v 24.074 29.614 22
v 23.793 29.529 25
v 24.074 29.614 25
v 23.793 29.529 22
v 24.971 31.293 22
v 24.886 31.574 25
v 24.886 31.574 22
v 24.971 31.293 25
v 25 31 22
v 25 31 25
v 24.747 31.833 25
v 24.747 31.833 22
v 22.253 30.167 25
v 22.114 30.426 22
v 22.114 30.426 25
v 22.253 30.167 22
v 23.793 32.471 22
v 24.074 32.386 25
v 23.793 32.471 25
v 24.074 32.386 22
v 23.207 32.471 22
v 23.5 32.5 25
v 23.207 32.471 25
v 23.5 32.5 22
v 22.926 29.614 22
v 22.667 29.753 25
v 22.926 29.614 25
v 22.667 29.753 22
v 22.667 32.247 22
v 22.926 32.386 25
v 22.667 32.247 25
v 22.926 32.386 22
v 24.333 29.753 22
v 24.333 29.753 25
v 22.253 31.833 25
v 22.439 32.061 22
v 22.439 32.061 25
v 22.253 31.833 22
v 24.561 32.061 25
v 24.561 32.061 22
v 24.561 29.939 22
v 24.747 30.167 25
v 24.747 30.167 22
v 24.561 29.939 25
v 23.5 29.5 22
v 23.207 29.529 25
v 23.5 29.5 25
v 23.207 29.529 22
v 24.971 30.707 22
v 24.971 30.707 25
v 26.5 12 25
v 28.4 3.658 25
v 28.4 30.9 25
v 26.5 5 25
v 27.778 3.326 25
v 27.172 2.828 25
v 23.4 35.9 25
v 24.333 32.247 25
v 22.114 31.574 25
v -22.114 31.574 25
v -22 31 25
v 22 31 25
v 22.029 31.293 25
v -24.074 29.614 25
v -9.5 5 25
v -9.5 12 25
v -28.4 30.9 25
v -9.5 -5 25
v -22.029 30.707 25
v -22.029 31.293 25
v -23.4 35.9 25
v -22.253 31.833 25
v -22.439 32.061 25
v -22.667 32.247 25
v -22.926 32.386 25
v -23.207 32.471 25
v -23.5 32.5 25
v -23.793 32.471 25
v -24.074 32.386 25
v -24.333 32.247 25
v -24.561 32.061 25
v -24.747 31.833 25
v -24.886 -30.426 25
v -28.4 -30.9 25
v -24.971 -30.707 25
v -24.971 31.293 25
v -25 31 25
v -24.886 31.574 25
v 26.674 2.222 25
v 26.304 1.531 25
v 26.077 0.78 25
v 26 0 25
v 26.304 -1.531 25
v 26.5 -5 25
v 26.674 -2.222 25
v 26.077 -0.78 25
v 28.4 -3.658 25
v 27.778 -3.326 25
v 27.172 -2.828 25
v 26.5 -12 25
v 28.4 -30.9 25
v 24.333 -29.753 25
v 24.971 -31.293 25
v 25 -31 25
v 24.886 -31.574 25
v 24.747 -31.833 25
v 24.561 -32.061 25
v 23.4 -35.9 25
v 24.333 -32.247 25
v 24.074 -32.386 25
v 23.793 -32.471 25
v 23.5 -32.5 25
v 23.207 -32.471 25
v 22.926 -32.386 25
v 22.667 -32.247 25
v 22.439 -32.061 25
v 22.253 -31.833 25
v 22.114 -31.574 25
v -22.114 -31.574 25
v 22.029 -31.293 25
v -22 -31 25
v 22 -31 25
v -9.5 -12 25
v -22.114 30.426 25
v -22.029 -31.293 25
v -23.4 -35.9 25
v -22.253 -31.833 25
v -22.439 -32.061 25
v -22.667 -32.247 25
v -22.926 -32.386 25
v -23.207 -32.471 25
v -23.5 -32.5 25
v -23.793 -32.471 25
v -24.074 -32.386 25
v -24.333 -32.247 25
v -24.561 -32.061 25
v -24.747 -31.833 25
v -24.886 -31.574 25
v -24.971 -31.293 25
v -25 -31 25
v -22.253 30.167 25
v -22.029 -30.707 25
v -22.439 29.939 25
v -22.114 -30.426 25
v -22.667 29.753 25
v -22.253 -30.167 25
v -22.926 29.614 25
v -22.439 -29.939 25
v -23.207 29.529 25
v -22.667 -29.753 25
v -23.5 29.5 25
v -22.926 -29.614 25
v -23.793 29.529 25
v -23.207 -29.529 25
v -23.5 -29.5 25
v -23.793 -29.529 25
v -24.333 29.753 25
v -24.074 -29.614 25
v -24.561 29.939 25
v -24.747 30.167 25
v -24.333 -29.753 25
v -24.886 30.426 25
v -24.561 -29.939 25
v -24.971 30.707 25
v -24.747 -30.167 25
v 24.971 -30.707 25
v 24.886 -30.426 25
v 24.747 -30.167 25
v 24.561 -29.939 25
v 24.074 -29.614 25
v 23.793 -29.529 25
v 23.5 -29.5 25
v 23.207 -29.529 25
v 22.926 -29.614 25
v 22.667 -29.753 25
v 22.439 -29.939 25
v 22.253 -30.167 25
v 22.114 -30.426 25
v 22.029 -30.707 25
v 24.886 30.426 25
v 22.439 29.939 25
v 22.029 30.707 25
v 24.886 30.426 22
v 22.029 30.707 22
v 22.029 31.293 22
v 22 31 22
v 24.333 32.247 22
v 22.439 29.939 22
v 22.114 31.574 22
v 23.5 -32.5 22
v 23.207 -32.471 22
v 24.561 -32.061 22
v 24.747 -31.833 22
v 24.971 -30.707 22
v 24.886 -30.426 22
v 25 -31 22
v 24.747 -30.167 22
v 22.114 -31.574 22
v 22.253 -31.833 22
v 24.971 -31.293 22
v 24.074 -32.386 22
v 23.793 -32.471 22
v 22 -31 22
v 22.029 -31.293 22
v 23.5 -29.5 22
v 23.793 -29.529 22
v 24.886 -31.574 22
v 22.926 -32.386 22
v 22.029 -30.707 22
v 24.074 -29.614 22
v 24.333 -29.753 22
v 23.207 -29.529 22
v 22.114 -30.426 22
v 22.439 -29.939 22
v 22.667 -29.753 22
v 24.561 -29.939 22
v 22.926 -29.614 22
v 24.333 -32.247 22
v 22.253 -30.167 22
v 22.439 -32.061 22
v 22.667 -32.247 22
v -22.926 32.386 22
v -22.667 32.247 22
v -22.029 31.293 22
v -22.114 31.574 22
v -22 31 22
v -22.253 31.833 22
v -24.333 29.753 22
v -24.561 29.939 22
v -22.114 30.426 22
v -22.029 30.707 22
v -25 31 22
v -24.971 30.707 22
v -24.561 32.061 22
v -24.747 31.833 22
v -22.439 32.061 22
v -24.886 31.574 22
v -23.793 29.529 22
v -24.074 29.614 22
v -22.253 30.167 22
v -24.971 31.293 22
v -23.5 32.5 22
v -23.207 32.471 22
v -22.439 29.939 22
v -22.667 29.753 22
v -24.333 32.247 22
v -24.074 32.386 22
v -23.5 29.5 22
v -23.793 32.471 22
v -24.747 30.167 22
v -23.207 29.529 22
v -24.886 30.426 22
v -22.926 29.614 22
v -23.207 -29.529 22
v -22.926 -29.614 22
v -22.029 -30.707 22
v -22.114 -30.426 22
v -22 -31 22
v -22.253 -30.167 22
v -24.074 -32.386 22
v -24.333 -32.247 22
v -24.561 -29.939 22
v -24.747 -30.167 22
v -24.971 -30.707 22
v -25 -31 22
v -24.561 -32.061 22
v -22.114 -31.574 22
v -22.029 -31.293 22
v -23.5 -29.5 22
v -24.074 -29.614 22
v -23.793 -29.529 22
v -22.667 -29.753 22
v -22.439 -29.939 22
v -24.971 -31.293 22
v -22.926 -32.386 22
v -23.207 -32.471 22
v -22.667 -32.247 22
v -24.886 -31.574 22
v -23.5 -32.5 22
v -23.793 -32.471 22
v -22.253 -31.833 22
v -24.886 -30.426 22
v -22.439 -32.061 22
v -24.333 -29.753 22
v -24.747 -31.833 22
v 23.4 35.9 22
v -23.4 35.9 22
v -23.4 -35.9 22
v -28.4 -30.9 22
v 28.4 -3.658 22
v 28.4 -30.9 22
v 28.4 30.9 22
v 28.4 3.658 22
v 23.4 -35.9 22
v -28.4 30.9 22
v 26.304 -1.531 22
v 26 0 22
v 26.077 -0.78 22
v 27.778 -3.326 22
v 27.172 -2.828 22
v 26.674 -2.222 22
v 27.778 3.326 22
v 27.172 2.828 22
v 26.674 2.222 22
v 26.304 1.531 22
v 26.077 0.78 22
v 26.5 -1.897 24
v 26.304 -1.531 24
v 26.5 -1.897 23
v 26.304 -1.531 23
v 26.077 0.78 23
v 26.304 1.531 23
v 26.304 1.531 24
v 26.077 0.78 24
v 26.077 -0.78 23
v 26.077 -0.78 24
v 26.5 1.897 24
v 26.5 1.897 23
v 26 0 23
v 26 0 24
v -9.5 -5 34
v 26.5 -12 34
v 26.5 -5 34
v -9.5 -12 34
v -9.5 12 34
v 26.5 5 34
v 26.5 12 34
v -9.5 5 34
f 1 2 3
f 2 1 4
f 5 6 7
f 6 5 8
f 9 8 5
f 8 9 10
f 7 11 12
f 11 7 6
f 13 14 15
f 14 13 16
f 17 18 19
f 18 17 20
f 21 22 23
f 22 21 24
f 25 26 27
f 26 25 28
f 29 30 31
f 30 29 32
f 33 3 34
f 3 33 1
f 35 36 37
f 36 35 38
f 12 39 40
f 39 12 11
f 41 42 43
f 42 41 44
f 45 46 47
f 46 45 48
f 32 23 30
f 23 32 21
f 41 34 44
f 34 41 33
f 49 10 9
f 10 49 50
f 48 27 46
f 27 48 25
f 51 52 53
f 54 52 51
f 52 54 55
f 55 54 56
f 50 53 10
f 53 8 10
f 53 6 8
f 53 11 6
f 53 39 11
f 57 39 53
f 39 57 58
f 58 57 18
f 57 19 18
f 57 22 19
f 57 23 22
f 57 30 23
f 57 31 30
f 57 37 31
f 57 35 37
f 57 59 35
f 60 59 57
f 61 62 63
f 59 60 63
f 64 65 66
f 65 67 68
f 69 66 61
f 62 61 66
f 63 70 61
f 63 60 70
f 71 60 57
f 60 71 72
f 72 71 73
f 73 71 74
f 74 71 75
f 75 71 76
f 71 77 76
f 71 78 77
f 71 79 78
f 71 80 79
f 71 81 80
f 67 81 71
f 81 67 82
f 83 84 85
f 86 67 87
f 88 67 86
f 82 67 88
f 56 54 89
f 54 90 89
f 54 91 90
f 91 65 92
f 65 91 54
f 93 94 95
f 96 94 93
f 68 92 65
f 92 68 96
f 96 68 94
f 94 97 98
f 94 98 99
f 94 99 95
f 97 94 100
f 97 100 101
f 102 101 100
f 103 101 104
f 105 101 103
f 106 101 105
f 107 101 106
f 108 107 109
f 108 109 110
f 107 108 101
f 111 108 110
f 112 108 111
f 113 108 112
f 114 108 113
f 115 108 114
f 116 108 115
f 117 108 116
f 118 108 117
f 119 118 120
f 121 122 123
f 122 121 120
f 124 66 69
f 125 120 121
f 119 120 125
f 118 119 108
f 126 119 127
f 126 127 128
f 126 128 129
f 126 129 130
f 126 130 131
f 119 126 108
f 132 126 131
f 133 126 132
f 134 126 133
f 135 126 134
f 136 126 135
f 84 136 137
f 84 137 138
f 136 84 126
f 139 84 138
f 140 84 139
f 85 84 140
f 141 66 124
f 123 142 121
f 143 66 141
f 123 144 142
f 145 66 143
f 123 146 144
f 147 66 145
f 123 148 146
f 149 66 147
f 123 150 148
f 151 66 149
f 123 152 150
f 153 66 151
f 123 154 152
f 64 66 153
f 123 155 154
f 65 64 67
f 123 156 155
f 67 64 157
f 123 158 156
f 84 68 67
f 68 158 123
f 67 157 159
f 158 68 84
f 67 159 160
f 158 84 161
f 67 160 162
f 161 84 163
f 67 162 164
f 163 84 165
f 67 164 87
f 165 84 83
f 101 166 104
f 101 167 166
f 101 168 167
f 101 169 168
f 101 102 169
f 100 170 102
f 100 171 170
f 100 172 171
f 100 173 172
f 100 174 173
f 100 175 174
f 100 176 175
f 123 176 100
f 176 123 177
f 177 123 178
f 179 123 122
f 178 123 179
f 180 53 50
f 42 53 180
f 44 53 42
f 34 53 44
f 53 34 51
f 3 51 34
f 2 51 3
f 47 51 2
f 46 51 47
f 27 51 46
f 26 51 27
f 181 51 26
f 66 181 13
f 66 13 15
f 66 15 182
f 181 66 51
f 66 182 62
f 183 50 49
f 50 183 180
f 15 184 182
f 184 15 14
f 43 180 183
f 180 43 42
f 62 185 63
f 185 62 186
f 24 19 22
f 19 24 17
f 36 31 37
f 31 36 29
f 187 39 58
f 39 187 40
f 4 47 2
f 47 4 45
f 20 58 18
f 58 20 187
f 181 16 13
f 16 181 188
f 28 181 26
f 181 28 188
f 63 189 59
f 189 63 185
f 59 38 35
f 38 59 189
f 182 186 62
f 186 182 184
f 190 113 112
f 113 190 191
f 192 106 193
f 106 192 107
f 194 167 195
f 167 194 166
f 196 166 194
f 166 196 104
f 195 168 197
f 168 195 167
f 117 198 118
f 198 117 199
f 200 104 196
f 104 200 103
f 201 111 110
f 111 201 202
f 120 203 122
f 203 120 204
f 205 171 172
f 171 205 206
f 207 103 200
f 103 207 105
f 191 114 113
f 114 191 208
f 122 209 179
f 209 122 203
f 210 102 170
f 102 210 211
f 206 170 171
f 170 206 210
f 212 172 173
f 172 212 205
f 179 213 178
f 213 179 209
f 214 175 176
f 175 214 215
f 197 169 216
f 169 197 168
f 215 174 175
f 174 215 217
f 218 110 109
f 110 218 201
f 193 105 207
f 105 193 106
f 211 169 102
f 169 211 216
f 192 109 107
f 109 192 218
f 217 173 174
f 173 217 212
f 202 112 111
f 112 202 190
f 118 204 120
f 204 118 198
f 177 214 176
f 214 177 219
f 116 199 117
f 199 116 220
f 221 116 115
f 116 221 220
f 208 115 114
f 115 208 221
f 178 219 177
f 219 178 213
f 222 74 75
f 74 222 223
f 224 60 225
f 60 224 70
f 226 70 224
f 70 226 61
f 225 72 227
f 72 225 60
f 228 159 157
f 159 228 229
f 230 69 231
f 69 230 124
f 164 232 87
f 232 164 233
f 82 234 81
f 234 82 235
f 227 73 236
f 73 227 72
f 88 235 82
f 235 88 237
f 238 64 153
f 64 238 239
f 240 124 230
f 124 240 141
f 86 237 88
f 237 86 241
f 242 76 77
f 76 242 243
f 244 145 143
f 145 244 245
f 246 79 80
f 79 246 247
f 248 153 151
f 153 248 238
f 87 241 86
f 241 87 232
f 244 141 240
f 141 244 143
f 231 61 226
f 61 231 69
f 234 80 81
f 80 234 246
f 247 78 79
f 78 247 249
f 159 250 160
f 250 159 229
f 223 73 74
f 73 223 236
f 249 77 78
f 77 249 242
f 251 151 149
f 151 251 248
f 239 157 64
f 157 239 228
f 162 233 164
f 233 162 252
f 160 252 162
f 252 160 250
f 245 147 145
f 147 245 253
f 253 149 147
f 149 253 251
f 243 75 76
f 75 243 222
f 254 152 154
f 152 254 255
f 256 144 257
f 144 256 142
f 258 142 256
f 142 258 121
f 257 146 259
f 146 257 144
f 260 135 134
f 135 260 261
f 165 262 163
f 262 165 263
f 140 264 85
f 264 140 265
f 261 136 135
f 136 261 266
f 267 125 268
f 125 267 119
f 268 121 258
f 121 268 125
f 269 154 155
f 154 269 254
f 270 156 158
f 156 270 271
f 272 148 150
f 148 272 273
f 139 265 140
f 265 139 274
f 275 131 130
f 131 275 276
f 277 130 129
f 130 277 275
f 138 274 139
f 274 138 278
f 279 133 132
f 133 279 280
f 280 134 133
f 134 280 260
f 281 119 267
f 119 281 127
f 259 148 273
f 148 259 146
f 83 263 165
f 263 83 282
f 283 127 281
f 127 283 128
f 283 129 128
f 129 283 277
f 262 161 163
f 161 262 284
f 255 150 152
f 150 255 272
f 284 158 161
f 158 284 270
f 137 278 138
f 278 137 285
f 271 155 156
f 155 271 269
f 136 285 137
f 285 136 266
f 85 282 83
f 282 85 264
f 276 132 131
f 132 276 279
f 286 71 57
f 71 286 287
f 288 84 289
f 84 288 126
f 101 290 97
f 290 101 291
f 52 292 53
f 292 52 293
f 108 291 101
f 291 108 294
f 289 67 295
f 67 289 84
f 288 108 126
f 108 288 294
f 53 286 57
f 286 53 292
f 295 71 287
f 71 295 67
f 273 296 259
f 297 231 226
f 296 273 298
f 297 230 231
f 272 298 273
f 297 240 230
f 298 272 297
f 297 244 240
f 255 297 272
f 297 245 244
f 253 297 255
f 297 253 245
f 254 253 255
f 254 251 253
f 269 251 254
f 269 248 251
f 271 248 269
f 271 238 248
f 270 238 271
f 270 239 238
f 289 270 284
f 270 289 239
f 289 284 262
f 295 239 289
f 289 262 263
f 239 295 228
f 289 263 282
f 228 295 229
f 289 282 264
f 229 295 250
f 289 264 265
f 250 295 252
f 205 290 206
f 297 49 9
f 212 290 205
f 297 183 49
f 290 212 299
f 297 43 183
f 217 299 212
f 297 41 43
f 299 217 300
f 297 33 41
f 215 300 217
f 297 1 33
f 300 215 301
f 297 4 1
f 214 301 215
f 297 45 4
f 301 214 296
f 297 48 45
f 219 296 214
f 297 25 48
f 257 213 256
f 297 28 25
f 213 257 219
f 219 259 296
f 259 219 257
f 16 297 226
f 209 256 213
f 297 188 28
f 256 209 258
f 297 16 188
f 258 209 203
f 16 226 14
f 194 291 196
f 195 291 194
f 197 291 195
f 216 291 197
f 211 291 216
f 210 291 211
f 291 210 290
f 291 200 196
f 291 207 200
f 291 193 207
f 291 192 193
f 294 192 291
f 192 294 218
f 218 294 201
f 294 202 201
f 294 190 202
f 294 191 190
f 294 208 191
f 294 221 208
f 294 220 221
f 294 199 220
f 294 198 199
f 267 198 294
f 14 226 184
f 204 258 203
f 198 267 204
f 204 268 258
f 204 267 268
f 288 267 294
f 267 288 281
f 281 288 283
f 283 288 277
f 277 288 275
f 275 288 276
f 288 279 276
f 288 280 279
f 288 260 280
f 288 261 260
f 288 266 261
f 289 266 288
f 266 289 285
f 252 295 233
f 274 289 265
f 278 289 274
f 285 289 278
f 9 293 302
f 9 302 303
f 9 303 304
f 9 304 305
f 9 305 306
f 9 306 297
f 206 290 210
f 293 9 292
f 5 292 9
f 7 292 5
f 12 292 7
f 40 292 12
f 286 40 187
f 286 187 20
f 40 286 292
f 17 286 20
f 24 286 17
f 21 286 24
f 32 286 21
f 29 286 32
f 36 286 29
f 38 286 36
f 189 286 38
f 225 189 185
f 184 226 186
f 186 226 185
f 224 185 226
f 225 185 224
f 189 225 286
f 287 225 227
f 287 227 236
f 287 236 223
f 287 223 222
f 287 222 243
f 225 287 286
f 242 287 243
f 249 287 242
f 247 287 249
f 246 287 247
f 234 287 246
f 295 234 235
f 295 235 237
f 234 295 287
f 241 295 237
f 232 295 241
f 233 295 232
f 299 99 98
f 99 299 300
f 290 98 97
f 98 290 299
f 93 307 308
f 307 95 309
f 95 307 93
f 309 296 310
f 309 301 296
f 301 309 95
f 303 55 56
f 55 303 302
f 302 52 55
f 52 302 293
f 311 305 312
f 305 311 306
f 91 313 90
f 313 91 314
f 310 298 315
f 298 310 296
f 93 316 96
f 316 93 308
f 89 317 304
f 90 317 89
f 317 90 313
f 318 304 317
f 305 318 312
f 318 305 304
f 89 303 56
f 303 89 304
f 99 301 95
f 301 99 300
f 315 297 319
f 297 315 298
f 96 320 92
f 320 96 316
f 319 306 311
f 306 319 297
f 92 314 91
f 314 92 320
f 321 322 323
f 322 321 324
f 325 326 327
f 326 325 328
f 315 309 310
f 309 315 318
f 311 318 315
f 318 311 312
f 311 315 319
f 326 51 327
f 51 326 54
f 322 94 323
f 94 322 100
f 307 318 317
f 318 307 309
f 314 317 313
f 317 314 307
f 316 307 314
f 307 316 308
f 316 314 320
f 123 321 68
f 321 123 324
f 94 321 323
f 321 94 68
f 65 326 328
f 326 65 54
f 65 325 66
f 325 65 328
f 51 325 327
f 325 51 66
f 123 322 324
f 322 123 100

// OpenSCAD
part = "cover"; // [enclosure:Enclosure, cover:Cover, both:Enclosure and Cover]

VINDIRKING_WIDTH = 53; // mm
VINDIRKING_DEPTH = 50; // mm
VINDIRKING_USB_FRONT = 17; // mm
VINDIRKING_USB_SIDE  = 13; // mm
VINDIRKING_USB_HEIGHT = 10; // mm


cablewidth = (VINDIRKING_WIDTH - (VINDIRKING_USB_SIDE * 2) - 13)/2;

module holder() { translate([-VINDIRKING_DEPTH/2,-VINDIRKING_WIDTH/2,0]) difference(){
cube([VINDIRKING_DEPTH, VINDIRKING_WIDTH, VINDIRKING_USB_HEIGHT+1]);
translate([0,0,1]) {
linear_extrude(VINDIRKING_USB_HEIGHT) polygon([
[0,0],
[0,VINDIRKING_WIDTH],
[VINDIRKING_DEPTH,VINDIRKING_WIDTH],
[VINDIRKING_DEPTH,0],
[VINDIRKING_DEPTH-VINDIRKING_USB_SIDE,0],
[VINDIRKING_DEPTH-VINDIRKING_USB_SIDE,VINDIRKING_WIDTH-VINDIRKING_USB_FRONT],
[VINDIRKING_DEPTH-VINDIRKING_USB_SIDE-cablewidth,VINDIRKING_WIDTH-VINDIRKING_USB_FRONT],
[VINDIRKING_DEPTH-VINDIRKING_USB_SIDE-cablewidth,0],
[VINDIRKING_USB_SIDE+cablewidth,0],
[VINDIRKING_USB_SIDE+cablewidth,VINDIRKING_WIDTH-VINDIRKING_USB_FRONT],
[VINDIRKING_USB_SIDE,VINDIRKING_WIDTH-VINDIRKING_USB_FRONT],
[VINDIRKING_USB_SIDE,0],
]);
};
};
};


// https://github.com/gregmarra/project_box
// The MIT License (MIT)
// 
// Copyright (c) 2014 Greg Marra
// 
// Permission is hereby granted, free of charge, to any person obtaining a copy
// of this software and associated documentation files (the "Software"), to deal
// in the Software without restriction, including without limitation the rights
// to use, copy, modify, merge, publish, distribute, sublicense, and/or sell
// copies of the Software, and to permit persons to whom the Software is
// furnished to do so, subject to the following conditions:
// 
// The above copyright notice and this permission notice shall be included in all
// copies or substantial portions of the Software.
// 
// THE SOFTWARE IS PROVIDED "AS IS", WITHOUT WARRANTY OF ANY KIND, EXPRESS OR
// IMPLIED, INCLUDING BUT NOT LIMITED TO THE WARRANTIES OF MERCHANTABILITY,
// FITNESS FOR A PARTICULAR PURPOSE AND NONINFRINGEMENT. IN NO EVENT SHALL THE
// AUTHORS OR COPYRIGHT HOLDERS BE LIABLE FOR ANY CLAIM, DAMAGES OR OTHER
// LIABILITY, WHETHER IN AN ACTION OF CONTRACT, TORT OR OTHERWISE, ARISING FROM,
// OUT OF OR IN CONNECTION WITH THE SOFTWARE OR THE USE OR OTHER DEALINGS IN THE
// SOFTWARE.

enclosure_inner_length = 55;
enclosure_inner_width = 70;
enclosure_inner_depth = 20;

enclosure_thickness = 2;

cover_thickness = 3;


print_part();

module print_part() {
	if (part == "enclosure") {
		box2(enclosure_inner_length,enclosure_inner_width,enclosure_inner_depth,enclosure_thickness,enclosure_thickness/2-0.10,cover_thickness);
	} else if (part == "cover") {
		lid2(enclosure_inner_length,enclosure_inner_width,enclosure_inner_depth,enclosure_thickness,enclosure_thickness/2+0.10,cover_thickness);
	} else {
		both();
	}
}

module both() {

	box2(enclosure_inner_length,enclosure_inner_width,enclosure_inner_depth,enclosure_thickness,enclosure_thickness/2-0.10,cover_thickness);
	lid2(enclosure_inner_length,enclosure_inner_width,enclosure_inner_depth,enclosure_thickness,enclosure_thickness/2+0.10,cover_thickness);

}

module screws(in_x, in_y, in_z, shell) {

	sx = in_x/2 - 4;
	sy = in_y/2 - 4;
	sh = shell + in_z - 12;
	nh = shell + in_z - 4;

	translate([0,0,0]) {
		translate([sx , sy, sh]) cylinder(r=1.5, h = 15, $fn=32);
		translate([sx , -sy, sh ]) cylinder(r=1.5, h = 15, $fn=32);
		translate([-sx , sy, sh ]) cylinder(r=1.5, h = 15, $fn=32);
		translate([-sx , -sy, sh ]) cylinder(r=1.5, h = 15, $fn=32);
	
	
		translate([-sx , -sy, nh ]) rotate([0,0,-45]) 
			translate([-5.75/2, -5.6/2, -0.7]) cube ([5.75, 10, 2.8]);
		translate([sx , -sy, nh ]) rotate([0,0,45]) 
			translate([-5.75/2, -5.6/2, -0.7]) cube ([5.75, 10, 2.8]);
		translate([sx , sy, nh ]) rotate([0,0,90+45]) 
			translate([-5.75/2, -5.6/2, -0.7]) cube ([5.75, 10, 2.8]);
		translate([-sx , sy, nh ]) rotate([0,0,-90-45]) 
			translate([-5.75/2, -5.6/2, -0.7]) cube ([5.75, 10, 2.8]);
	}
}

module bottom(in_x, in_y, in_z, shell) {

	hull() {
   	 	translate([-in_x/2+shell, -in_y/2+shell, 0]) cylinder(r=shell*2,h=shell, $fn=32);
		translate([+in_x/2-shell, -in_y/2+shell, 0]) cylinder(r=shell*2,h=shell, $fn=32);
		translate([+in_x/2-shell, in_y/2-shell, 0]) cylinder(r=shell*2,h=shell, $fn=32);
		translate([-in_x/2+shell, in_y/2-shell, 0]) cylinder(r=shell*2,h=shell, $fn=32);
	}
}

module sides(in_x, in_y, in_z, shell) {
	translate([0,0,shell])
	difference() {
		hull() {
	   	 	translate([-in_x/2+shell, -in_y/2+shell, 0]) cylinder(r=shell*2,h=in_z, $fn=32);
			translate([+in_x/2-shell, -in_y/2+shell, 0]) cylinder(r=shell*2,h=in_z, $fn=32);
			translate([+in_x/2-shell, in_y/2-shell, 0]) cylinder(r=shell*2,h=in_z, $fn=32);
			translate([-in_x/2+shell, in_y/2-shell, 0]) cylinder(r=shell*2,h=in_z, $fn=32);
		}
	
		hull() {
	   	 	translate([-in_x/2+shell, -in_y/2+shell, 0]) cylinder(r=shell,h=in_z+1, $fn=32);
			translate([+in_x/2-shell, -in_y/2+shell, 0]) cylinder(r=shell,h=in_z+1, $fn=32);
			translate([+in_x/2-shell, in_y/2-shell, 0]) cylinder(r=shell,h=in_z+1, $fn=32);
			translate([-in_x/2+shell, in_y/2-shell, 0]) cylinder(r=shell,h=in_z+1, $fn=32);
		}
	}
	
	intersection() {
		translate([-in_x/2, -in_y/2, shell]) cube([in_x, in_y, in_z+2]);
		union() {
			translate([-in_x/2 , -in_y/2,shell + in_z -6]) cylinder(r=9, h = 6, $fn=64);
			translate([-in_x/2 , -in_y/2,shell + in_z -10]) cylinder(r1=3, r2=9, h = 4, $fn=64);
		
			translate([in_x/2 , -in_y/2, shell + in_z -6]) cylinder(r=9, h = 6, $fn=64);
			translate([in_x/2 , -in_y/2, shell + in_z -10]) cylinder(r1=3, r2=9, h = 4, $fn=64);
		
			translate([in_x/2 , in_y/2,  shell + in_z -6]) cylinder(r=9, h = 6, $fn=64);
			translate([in_x/2 , in_y/2,  shell + in_z -10]) cylinder(r1=3, r2=9, h = 4, $fn=64);
		
			translate([-in_x/2 , in_y/2, shell + in_z -6]) cylinder(r=9, h = 6, $fn=64);
			translate([-in_x/2 , in_y/2, shell + in_z -10]) cylinder(r1=3, r2=9, h = 4, $fn=64);
		}
	}
}

module lid_top_lip2(in_x, in_y, in_z, shell, top_lip, top_thickness) {

	cxm = -in_x/2 - (shell-top_lip);
	cxp = in_x/2 + (shell-top_lip);
	cym = -in_y/2 - (shell-top_lip);
	cyp = in_y/2 + (shell-top_lip);

	translate([0,0,shell+in_z])

	difference() {
	
		hull() {
	   	 	translate([-in_x/2+shell, -in_y/2+shell, 0]) cylinder(r=shell*2,h=top_thickness, $fn=32);
			translate([+in_x/2-shell, -in_y/2+shell, 0]) cylinder(r=shell*2,h=top_thickness, $fn=32);
			translate([+in_x/2-shell, in_y/2-shell, 0]) cylinder(r=shell*2,h=top_thickness, $fn=32);
			translate([-in_x/2+shell, in_y/2-shell, 0]) cylinder(r=shell*2,h=top_thickness, $fn=32);
		}
	
		
		translate([0, 0, -1]) linear_extrude(height = top_thickness + 2) polygon(points = [
			[cxm+5, cym],
			[cxm, cym+5],
			[cxm, cyp-5],
			[cxm+5, cyp],
			[cxp-5, cyp],
			[cxp, cyp-5],
			[cxp, cym+5],
			[cxp-5, cym]]);
	}
}

module lid2(in_x, in_y, in_z, shell, top_lip, top_thickness) {

	cxm = -in_x/2 - (shell-top_lip);
	cxp = in_x/2 + (shell-top_lip);
	cym = -in_y/2 - (shell-top_lip);
	cyp = in_y/2 + (shell-top_lip);	

	difference() {
		translate([0, 0, in_z+shell]) linear_extrude(height = top_thickness ) polygon(points = [
			[cxm+5, cym],
			[cxm, cym+5],
			[cxm, cyp-5],
			[cxm+5, cyp],
			[cxp-5, cyp],
			[cxp, cyp-5],
			[cxp, cym+5],
			[cxp-5, cym]]);
		  hole("lid", 4, [30, 0]);
	
			screws(in_x, in_y, in_z, shell);
	}
  rotate(90) translate([0, 0, in_z+top_thickness]) holder();
}

halfwidth = (enclosure_inner_width/2);
module box2(in_x, in_y, in_z, shell, top_lip, top_thickness) {
	bottom(in_x, in_y, in_z, shell);
	difference() {
		sides(in_x, in_y, in_z, shell);
		screws(in_x, in_y, in_z, shell);
		for (j = [4:8:32]) for (i = [-halfwidth+6:8:halfwidth-2]) hole("length_1", 2, [i, j]);
	}
	lid_top_lip2(in_x, in_y, in_z, shell, top_lip, top_thickness);
}

module punch_hole(cylinder, rotate, translate_coords) {
	translate(translate_coords) rotate (rotate) cylinder (h = cylinder[1], r=cylinder[0], center = false, $fn=32);
}

module hole(side, radius, offset) {
	// side is "[length/width]_[1/2]"
	// radius is hole radius
	// offset is [horizontal, height] from the [center, bottom] of the side, or from the [center, center] of the lid.

	if (side == "length_1") {
		assign (
			rotate = [90,0,90], 
			translate_coords = [enclosure_thickness+1, offset[0], offset[1]], 
			length = enclosure_inner_length/2) {
				punch_hole([radius, length], rotate, translate_coords);
		}
	}
	if (side == "length_2") {
		assign (
			rotate = [90,0,270], 
			translate_coords = [-(enclosure_thickness+1), offset[0], offset[1]], 
			length = enclosure_inner_length/2) {
				punch_hole([radius, length], rotate, translate_coords);
		}
	}
	if (side == "width_1") {
		assign (
			rotate = [90,0,0], 
			translate_coords = [offset[0], -(enclosure_thickness+1), offset[1]], 
			length = enclosure_inner_width/2) {
				punch_hole([radius, length], rotate, translate_coords);
		}
	}
	if (side == "width_2") {
		assign (
			rotate = [90,0,180], 
			translate_coords = [offset[0], enclosure_thickness+1, offset[1]], 
			length = enclosure_inner_width/2) {
				punch_hole([radius, length], rotate, translate_coords);
		}
	}
	if (side == "lid") {
		assign (
			rotate = [0,0,0], 
			translate_coords = [offset[0], offset[1], enclosure_inner_depth-cover_thickness], 
			length = enclosure_inner_depth/2) {
				punch_hole([radius, length], rotate, translate_coords);
		}
	}
}
